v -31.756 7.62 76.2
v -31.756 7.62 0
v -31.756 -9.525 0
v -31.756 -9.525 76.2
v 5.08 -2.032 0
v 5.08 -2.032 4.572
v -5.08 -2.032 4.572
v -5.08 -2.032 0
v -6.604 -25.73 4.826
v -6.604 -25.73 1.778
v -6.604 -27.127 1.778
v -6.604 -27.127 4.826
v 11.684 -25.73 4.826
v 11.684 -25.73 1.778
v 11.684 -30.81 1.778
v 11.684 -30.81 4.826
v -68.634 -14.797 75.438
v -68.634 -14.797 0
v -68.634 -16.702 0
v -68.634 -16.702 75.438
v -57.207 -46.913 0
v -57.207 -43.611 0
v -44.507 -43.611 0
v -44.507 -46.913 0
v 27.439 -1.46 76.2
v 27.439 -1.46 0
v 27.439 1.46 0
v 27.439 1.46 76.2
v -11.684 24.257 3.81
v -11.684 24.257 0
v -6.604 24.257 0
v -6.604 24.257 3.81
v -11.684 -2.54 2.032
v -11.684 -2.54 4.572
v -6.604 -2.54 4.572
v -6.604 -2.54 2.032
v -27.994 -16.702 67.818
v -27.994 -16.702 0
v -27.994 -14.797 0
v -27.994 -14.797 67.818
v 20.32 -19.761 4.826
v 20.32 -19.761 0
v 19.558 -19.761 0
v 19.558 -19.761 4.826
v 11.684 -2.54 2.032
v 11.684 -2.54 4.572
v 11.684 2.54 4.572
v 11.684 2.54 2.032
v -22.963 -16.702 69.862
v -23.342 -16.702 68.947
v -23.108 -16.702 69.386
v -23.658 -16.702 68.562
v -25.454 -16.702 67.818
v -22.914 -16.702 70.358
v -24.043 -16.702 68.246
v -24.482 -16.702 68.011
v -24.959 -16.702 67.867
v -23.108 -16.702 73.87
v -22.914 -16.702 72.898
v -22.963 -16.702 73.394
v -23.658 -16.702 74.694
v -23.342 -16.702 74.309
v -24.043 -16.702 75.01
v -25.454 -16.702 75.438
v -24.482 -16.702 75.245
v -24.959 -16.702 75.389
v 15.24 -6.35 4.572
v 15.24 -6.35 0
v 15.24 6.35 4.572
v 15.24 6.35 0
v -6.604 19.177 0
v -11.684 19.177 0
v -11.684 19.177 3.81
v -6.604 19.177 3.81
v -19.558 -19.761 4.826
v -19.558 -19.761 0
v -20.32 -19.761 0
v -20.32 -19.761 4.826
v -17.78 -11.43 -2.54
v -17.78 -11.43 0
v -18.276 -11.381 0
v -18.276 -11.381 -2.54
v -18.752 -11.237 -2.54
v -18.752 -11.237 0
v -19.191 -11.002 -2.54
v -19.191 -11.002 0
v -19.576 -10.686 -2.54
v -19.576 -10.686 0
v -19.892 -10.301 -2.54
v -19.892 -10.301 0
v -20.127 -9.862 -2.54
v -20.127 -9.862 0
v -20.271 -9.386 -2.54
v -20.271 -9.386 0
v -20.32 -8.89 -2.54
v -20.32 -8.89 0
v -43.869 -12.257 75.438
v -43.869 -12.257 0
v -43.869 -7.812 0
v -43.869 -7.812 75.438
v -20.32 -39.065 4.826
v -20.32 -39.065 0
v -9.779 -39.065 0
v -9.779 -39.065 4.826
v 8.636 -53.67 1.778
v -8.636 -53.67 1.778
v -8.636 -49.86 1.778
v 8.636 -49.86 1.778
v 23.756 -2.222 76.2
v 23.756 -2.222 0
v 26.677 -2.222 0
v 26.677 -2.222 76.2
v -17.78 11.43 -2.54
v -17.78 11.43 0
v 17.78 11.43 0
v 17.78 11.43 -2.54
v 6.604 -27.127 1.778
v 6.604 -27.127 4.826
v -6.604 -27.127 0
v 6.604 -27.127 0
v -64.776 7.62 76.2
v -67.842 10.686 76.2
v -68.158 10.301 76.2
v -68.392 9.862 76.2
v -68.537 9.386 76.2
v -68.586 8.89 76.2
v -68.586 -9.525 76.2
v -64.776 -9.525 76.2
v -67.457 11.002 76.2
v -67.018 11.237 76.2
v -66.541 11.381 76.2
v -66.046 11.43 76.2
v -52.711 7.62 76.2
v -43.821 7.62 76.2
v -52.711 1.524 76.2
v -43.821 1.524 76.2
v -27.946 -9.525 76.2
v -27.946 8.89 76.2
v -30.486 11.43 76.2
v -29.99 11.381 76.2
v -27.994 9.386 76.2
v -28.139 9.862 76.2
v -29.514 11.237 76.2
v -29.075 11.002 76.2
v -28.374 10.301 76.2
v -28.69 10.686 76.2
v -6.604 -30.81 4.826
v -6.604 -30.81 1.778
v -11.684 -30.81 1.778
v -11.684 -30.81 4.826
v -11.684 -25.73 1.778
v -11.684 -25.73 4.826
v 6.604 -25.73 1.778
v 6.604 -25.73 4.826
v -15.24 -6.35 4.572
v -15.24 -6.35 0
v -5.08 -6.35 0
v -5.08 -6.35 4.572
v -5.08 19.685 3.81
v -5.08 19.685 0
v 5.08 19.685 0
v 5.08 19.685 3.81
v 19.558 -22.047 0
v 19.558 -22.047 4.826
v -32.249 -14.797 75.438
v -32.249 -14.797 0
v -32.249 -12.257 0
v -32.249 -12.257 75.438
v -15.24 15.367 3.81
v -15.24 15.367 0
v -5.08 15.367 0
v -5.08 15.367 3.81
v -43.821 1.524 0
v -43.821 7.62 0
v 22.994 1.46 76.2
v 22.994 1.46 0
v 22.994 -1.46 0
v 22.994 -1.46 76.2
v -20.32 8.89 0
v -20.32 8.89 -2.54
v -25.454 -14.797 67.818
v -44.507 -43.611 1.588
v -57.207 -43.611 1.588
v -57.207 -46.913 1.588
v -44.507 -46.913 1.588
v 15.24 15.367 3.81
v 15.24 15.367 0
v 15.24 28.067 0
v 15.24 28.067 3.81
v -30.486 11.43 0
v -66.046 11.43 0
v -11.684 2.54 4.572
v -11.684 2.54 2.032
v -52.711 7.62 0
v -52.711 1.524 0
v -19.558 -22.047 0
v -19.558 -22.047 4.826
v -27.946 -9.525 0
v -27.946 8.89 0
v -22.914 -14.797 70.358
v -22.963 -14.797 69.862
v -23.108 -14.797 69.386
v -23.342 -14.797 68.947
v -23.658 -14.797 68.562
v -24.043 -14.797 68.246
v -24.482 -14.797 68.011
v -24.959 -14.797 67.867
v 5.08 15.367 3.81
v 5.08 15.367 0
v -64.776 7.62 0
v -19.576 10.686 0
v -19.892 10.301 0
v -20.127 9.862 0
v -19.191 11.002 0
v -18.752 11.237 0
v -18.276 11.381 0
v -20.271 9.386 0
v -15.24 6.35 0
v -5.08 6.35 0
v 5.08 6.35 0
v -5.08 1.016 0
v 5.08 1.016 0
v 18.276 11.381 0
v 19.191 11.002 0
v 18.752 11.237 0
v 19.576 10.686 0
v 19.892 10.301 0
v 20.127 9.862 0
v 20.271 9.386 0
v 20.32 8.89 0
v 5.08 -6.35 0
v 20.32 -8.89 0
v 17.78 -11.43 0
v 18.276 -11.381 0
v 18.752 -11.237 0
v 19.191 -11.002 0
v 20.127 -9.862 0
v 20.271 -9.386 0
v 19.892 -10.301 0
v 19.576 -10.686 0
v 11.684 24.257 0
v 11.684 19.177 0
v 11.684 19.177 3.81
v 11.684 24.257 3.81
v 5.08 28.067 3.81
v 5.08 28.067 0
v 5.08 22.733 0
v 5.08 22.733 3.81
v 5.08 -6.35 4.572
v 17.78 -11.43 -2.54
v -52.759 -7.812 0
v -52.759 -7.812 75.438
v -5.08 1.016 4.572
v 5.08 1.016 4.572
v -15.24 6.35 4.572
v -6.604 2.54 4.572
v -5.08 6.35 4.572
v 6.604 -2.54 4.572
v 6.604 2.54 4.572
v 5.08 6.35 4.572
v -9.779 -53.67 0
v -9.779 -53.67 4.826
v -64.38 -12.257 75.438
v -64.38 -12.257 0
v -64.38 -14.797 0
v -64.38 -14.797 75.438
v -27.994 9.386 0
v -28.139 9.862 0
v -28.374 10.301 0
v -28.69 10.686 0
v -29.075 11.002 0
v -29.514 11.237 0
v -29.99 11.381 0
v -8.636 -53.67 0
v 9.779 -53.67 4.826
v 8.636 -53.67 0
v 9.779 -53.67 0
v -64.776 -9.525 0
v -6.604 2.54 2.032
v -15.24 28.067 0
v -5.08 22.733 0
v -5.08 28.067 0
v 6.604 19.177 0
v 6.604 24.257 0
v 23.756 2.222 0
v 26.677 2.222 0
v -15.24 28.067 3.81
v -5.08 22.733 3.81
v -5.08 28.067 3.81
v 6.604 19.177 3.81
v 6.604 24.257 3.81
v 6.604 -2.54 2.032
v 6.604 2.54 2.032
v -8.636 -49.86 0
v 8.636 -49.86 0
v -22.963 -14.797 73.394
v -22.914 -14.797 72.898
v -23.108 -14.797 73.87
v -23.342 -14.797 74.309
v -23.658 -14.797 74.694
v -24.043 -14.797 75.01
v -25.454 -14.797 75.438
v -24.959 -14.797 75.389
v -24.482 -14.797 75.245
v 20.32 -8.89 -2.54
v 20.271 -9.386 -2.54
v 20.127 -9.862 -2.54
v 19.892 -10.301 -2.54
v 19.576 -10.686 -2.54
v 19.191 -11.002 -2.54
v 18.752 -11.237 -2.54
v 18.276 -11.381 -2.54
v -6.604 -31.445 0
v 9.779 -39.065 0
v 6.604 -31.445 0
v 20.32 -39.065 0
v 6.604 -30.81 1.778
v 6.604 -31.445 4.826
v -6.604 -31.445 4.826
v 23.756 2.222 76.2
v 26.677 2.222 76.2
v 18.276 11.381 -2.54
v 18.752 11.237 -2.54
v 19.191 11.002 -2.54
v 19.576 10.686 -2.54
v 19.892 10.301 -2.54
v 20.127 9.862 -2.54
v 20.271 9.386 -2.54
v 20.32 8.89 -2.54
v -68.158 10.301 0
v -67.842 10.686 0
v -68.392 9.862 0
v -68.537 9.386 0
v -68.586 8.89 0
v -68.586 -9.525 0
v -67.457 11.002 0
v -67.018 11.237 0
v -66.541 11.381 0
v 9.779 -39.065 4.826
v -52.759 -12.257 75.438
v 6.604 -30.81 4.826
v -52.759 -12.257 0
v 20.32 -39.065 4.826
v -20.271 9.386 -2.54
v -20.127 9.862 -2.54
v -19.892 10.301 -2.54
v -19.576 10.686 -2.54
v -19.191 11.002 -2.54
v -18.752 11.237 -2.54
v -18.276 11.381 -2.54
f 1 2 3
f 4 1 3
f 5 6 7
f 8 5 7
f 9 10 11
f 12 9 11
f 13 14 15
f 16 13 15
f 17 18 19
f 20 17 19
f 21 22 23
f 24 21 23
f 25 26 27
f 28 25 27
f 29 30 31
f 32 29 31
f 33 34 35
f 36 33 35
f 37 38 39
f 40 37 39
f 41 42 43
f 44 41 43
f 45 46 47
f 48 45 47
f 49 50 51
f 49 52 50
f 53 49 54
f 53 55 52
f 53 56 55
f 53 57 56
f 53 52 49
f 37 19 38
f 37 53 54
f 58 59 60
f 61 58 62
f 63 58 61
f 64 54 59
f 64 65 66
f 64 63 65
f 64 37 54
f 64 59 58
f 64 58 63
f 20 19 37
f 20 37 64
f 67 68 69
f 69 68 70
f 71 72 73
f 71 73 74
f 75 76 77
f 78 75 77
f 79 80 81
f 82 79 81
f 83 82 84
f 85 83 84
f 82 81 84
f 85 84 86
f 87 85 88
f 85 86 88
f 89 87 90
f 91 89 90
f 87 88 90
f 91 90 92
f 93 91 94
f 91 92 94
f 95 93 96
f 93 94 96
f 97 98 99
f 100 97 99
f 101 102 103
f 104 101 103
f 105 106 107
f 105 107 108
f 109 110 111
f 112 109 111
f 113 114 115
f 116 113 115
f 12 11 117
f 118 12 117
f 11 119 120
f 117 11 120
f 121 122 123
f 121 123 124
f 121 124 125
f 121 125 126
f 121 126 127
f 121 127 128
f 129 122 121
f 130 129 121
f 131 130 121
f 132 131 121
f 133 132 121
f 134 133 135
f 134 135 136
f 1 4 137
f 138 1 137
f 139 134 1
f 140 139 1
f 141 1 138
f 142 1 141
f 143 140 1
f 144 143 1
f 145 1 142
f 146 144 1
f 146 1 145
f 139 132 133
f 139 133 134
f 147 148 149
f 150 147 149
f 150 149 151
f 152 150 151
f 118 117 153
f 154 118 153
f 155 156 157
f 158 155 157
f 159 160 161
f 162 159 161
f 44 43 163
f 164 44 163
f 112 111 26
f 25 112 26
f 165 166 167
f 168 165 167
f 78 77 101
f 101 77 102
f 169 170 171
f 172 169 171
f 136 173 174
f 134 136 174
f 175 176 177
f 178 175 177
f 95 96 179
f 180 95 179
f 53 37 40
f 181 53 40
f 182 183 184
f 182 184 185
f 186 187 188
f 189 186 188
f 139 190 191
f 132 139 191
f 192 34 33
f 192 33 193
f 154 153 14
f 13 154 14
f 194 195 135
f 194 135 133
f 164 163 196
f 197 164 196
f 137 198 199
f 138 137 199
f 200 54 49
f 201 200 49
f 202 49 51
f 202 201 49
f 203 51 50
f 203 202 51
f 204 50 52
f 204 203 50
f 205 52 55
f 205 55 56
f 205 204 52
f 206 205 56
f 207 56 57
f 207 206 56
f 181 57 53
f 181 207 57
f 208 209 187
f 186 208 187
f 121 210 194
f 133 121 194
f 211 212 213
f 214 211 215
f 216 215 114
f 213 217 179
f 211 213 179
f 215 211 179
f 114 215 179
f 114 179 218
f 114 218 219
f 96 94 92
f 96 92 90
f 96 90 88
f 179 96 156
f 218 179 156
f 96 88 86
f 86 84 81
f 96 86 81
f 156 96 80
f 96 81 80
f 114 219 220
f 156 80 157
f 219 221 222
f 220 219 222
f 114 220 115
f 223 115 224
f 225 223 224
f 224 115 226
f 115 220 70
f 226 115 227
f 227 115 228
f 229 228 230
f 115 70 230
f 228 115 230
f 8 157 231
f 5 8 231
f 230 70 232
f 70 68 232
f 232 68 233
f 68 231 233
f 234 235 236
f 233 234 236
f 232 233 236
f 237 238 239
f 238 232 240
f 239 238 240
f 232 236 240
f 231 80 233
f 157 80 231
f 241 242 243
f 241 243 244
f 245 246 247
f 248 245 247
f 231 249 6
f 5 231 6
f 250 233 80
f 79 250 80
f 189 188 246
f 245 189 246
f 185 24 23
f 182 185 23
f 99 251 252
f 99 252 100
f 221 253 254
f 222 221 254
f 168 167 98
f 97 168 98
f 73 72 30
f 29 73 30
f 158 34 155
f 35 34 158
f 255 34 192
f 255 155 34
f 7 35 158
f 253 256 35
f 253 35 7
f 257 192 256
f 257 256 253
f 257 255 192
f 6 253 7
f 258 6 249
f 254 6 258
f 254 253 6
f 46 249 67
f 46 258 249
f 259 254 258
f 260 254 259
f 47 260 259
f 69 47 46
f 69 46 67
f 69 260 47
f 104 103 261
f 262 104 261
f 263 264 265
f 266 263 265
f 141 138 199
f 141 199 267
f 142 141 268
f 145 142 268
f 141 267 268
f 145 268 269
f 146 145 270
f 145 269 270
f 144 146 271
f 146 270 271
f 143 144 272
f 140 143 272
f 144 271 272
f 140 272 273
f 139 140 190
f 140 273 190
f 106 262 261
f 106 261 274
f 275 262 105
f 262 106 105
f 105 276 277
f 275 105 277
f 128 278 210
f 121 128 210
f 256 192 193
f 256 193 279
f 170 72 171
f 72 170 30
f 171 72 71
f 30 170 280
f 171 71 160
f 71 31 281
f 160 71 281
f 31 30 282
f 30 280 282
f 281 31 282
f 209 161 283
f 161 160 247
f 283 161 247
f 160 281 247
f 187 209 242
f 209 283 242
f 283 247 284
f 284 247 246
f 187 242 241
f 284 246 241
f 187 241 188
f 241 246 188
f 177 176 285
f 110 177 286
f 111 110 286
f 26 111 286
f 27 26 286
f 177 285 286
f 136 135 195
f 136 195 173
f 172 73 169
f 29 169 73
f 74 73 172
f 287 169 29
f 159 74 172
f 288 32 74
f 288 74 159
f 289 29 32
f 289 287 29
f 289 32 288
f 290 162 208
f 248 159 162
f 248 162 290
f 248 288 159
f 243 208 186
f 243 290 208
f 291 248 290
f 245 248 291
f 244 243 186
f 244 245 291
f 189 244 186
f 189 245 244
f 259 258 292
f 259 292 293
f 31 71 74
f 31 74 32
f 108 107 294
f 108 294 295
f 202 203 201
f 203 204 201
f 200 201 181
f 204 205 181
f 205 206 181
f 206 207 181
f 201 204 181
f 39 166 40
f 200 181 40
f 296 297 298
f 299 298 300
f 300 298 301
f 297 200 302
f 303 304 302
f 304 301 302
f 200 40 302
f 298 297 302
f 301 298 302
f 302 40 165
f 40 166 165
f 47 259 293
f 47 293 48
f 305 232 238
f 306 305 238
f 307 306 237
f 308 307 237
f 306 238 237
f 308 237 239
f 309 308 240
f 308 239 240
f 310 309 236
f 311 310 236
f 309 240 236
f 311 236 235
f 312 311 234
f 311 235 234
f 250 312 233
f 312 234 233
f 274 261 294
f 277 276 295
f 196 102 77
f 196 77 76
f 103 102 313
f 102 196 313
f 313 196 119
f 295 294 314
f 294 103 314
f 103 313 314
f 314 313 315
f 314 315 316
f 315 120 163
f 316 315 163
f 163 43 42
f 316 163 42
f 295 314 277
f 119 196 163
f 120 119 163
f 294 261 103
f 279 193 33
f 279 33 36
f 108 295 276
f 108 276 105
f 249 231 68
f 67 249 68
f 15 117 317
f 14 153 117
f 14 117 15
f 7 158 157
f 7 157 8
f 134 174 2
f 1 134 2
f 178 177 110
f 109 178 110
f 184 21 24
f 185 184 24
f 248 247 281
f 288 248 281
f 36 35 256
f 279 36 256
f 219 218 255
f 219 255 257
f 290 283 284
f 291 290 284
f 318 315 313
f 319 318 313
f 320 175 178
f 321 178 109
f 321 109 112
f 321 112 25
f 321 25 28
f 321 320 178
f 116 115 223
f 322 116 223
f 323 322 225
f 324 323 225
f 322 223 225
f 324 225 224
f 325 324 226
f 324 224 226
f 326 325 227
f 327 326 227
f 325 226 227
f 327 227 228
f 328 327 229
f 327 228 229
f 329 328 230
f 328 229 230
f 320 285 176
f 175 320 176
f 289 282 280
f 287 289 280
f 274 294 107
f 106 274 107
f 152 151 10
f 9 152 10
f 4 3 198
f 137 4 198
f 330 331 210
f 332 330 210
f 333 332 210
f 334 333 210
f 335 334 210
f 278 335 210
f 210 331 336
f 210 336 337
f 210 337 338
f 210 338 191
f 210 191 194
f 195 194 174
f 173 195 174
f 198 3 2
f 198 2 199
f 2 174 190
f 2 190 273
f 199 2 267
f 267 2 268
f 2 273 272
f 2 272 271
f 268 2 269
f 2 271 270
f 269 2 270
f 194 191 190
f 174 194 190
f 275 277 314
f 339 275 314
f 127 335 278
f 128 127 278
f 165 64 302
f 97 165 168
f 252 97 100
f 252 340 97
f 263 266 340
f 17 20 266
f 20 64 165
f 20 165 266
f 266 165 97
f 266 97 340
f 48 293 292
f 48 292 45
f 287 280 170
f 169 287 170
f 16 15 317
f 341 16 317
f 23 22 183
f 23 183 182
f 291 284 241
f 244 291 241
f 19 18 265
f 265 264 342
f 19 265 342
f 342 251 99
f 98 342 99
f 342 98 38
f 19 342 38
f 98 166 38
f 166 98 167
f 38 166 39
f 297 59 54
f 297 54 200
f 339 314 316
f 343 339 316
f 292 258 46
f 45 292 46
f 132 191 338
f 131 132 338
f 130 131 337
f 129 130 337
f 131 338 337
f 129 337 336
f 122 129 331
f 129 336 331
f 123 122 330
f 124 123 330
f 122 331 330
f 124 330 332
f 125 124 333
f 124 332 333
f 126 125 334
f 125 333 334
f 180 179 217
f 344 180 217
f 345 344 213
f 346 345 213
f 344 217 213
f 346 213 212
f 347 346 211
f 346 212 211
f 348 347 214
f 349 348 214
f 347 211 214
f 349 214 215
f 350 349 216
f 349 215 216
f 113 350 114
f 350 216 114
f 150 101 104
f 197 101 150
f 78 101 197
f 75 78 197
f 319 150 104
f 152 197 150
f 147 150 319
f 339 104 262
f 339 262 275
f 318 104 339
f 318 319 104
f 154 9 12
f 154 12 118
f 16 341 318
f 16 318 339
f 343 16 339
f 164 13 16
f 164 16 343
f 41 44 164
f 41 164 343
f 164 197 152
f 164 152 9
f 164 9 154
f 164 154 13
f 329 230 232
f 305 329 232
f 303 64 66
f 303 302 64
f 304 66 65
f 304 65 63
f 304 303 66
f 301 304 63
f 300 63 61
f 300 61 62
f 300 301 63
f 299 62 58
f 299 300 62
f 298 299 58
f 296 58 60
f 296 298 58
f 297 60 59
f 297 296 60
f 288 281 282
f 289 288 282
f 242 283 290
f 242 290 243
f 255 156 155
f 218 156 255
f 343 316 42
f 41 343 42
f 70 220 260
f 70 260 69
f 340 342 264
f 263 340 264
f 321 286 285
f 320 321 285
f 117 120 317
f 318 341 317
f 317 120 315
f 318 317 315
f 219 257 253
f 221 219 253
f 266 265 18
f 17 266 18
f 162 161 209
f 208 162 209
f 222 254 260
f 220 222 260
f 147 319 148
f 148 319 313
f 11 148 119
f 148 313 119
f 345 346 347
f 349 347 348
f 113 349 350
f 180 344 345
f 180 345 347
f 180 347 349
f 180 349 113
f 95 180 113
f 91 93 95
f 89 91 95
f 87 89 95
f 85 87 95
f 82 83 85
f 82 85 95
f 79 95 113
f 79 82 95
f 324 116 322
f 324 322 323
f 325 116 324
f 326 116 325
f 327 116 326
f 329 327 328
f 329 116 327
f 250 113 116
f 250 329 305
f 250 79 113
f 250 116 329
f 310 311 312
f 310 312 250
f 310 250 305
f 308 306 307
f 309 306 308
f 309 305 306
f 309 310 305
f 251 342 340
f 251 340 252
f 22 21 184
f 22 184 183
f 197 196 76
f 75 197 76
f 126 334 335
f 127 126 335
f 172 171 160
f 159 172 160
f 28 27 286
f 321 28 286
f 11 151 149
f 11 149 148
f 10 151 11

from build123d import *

# Parameters (mm, degrees)
F0_W      = 30.48
F0_H      = 12.7
F1_DEPTH  = 4.572
F2_W      = 5.08
F2_H      = 5.08
F3_DEPTH  = 2.54
F2_H_2    = 1.524
F2_H_3    = 3.81
F2_H_4    = 4.318
F4_DEPTH  = 7.62
F6_DEPTH  = 2.54
F8_DEPTH  = 76.2
F9_W      = 5.08
F9_H      = 5.08
F10_DEPTH = 3.81
F11_W     = 8.89
F11_H     = 6.096
F12_DEPTH = 76.2
F14_DEPTH = 4.826
F15_DEPTH = 1.778
F16_W     = 17.272
F16_H     = 1.778
F17_DEPTH = 3.81
F18_W     = 12.7
F18_H     = 3.302
F19_DEPTH = 1.5875
F20_W     = 8.89
F20_H     = 4.445
F21_DEPTH = 75.438
F22_W     = 1.905
F22_H     = 7.62
F23_DEPTH = 5.08
F24_R     = 2.54
F25_R     = 2.54


# Not quite as in the source:
# - a feature names something its author has since deleted; it is built from what else it names


with BuildPart() as f1:
    # F0 (on Top) → F1 (new body)
    with BuildSketch(Plane.XY):
        Rectangle(F0_W, F0_H)
    extrude(amount=F1_DEPTH)

    # F2 (on face) → F3 (cut)
    with BuildSketch(Plane.XY.offset(4.572)):
        with Locations((-9.144, 0)):
            Rectangle(F2_W, F2_H)
        with Locations((9.144, 0)):
            Rectangle(F2_W, F2_H)
    extrude(amount=-F3_DEPTH, mode=Mode.SUBTRACT)

    # F2 (on face) → F4 (cut)
    with BuildSketch(Plane.XY.offset(4.572)):
        with Locations((-2.54, 1.778)):
            Rectangle(F2_W, F2_H_2)
        with Locations((-2.54, 4.445)):
            Rectangle(F2_W, F2_H_3)
        Polygon((5.08, 6.35), (0, 6.35), (0, 2.54), (0, 1.016), (5.08, 1.016), align=None)
        with Locations((2.54, -4.191)):
            Rectangle(F2_W, F2_H_4)
        with Locations((-2.54, -4.191)):
            Rectangle(F2_W, F2_H_4)
    extrude(amount=-F4_DEPTH, mode=Mode.SUBTRACT)

    # F5 (on face) → F6 (join)
    with BuildSketch(Plane(origin=(0, 0, 0), x_dir=(1, 0, 0), z_dir=(0, 0, -1))):
        with BuildLine():
            Line((-20.32, -6.8208193406), (-20.32, -8.89))
            ThreePointArc((-20.32, -8.89), (-19.5760512242, -10.6860512242), (-17.78, -11.43))
            Line((-17.78, -11.43), (-17.2756779939, -11.43))
            Line((-17.2756779939, -11.43), (17.78, -11.43))
            ThreePointArc((17.78, -11.43), (19.5760512242, -10.6860512242), (20.32, -8.89))
            Line((20.32, -8.89), (20.32, 0))
            Line((20.32, 0), (20.32, 8.89))
            ThreePointArc((20.32, 8.89), (19.5760512242, 10.6860512242), (17.78, 11.43))
            Line((17.78, 11.43), (0, 11.43))
            Line((0, 11.43), (-17.78, 11.43))
            ThreePointArc((-17.78, 11.43), (-19.5760512242, 10.6860512242), (-20.32, 8.89))
            Line((-20.32, 8.89), (-20.32, -6.8208193406))
        make_face()
        Polygon((5.08, 6.35), (15.24, 6.35), (15.24, -6.35), (5.08, -6.35), (5.08, -1.016), (-5.08, -1.016), (-5.08, -6.35), (-15.24, -6.35), (-15.24, 6.35), (-5.08, 6.35), (-5.08, 2.032), (5.08, 2.032), align=None, mode=Mode.SUBTRACT)
        Polygon((15.24, -6.35), (15.24, 6.35), (5.08, 6.35), (5.08, 2.032), (-5.08, 2.032), (-5.08, 6.35), (-15.24, 6.35), (-15.24, -6.35), (-5.08, -6.35), (-5.08, -1.016), (5.08, -1.016), (5.08, -6.35), align=None)
    extrude(amount=F6_DEPTH)


with BuildPart() as f8:
    # F7 (on Top) → F8 (new body)
    with BuildSketch(Plane.XY):
        Polygon((27.4387739635, 1.4605), (26.6767739635, 2.2225), (23.7557739635, 2.2225), (22.9937739635, 1.4605), (22.9937739635, -1.4605), (23.7557739635, -2.2225), (25.2162739635, -2.2225), (26.6767739635, -2.2225), (27.4387739635, -1.4605), (27.4387739635, 0), align=None)
    extrude(amount=F8_DEPTH)


with BuildPart() as f10:
    # F9 (on Top) → F10 (new body)
    with BuildSketch(Plane.XY):
        Polygon((15.24, 15.3667641968), (15.24, 28.0667641968), (5.08, 28.0667641968), (5.08, 22.7327641968), (0, 22.7327641968), (-5.08, 22.7327641968), (-5.08, 24.2567641968), (-5.08, 28.0667641968), (-15.24, 28.0667641968), (-15.24, 15.3667641968), (-5.08, 15.3667641968), (-5.08, 19.6847641968), (0, 19.6847641968), (5.08, 19.6847641968), (5.08, 15.3667641968), align=None)
        with Locations((-9.144, 21.7167641968)):
            Rectangle(F9_W, F9_H, mode=Mode.SUBTRACT)
        with Locations((9.144, 21.7167641968)):
            Rectangle(F9_W, F9_H, mode=Mode.SUBTRACT)
    extrude(amount=F10_DEPTH)


with BuildPart() as f12:
    # F11 (on Top) → F12 (new body)
    with BuildSketch(Plane.XY):
        with Locations((-48.2656806707, 4.572)):
            Rectangle(F11_W, F11_H)
        with BuildLine():
            Line((-43.8206806707, 7.62), (-31.7556806707, 7.62))
            Line((-31.7556806707, 7.62), (-31.7556806707, -7.62))
            Line((-31.7556806707, -7.62), (-31.7556806707, -9.525))
            Line((-31.7556806707, -9.525), (-27.9456806707, -9.525))
            Line((-27.9456806707, -9.525), (-27.9456806707, 8.89))
            ThreePointArc((-27.9456806707, 8.89), (-28.6896294465, 10.6860512242), (-30.4856806707, 11.43))
            Line((-30.4856806707, 11.43), (-66.0456806707, 11.43))
            ThreePointArc((-66.0456806707, 11.43), (-67.841731895, 10.6860512242), (-68.5856806707, 8.89))
            Line((-68.5856806707, 8.89), (-68.5856806707, -9.525))
            Line((-68.5856806707, -9.525), (-64.7756806707, -9.525))
            Line((-64.7756806707, -9.525), (-64.7756806707, -7.62))
            Line((-64.7756806707, -7.62), (-64.7756806707, 7.62))
            Line((-64.7756806707, 7.62), (-52.7106806707, 7.62))
            Line((-52.7106806707, 7.62), (-43.8206806707, 7.62))
        make_face()
    extrude(amount=F12_DEPTH)


with BuildPart() as f14:
    # F13 (on Top) → F14 (new body)
    with BuildSketch(Plane.XY):
        Polygon((9.779, -53.6695963979), (9.779, -39.0645963979), (0, -39.0645963979), (-9.779, -39.0645963979), (-9.779, -53.6695963979), align=None)
        Polygon((-19.558, -22.0465963979), (-19.558, -19.7605963979), (-20.32, -19.7605963979), (-20.32, -39.0645963979), (-9.779, -39.0645963979), (0, -39.0645963979), (0, -31.4445963979), (-6.604, -31.4445963979), (-6.604, -30.8095963979), (-11.684, -30.8095963979), (-11.684, -25.7295963979), (-6.604, -25.7295963979), (-6.604, -27.1265963979), (0, -27.1265963979), (0, -22.0465963979), align=None)
        Polygon((20.32, -39.0645963979), (20.32, -19.7605963979), (19.558, -19.7605963979), (19.558, -22.0465963979), (0, -22.0465963979), (0, -27.1265963979), (6.604, -27.1265963979), (6.604, -25.7295963979), (11.684, -25.7295963979), (11.684, -30.8095963979), (6.604, -30.8095963979), (6.604, -31.4445963979), (0, -31.4445963979), (0, -39.0645963979), (9.779, -39.0645963979), align=None)
    extrude(amount=F14_DEPTH)

    # F13 (on Top) → F15 (join)
    with BuildSketch(Plane.XY):
        Polygon((-6.604, -28.2695963979), (-6.604, -27.1265963979), (-6.604, -25.7295963979), (-11.684, -25.7295963979), (-11.684, -30.8095963979), (-6.604, -30.8095963979), align=None)
        Polygon((6.604, -25.7295963979), (6.604, -27.1265963979), (6.604, -30.8095963979), (11.684, -30.8095963979), (11.684, -25.7295963979), align=None)
    extrude(amount=F15_DEPTH)

    # F16 (on face) → F17 (cut)
    with BuildSketch(Plane.XZ.offset(53.6695963979)):
        with Locations((0, 0.889)):
            Rectangle(F16_W, F16_H)
    extrude(amount=-F17_DEPTH, mode=Mode.SUBTRACT)


with BuildPart() as f19:
    # F18 (on Top) → F19 (new body)
    with BuildSketch(Plane.XY):
        with Locations((-50.8568691254, -45.2617781689)):
            Rectangle(F18_W, F18_H)
    extrude(amount=F19_DEPTH)


with BuildPart() as f21:
    # F20 (on Top) → F21 (new body)
    with BuildSketch(Plane.XY):
        with Locations((-48.3141668069, -10.0349279085)):
            Rectangle(F20_W, F20_H)
        Polygon((-64.3796668069, -14.7974279085), (-32.2486668069, -14.7974279085), (-32.2486668069, -12.2574279085), (-43.8691668069, -12.2574279085), (-52.7591668069, -12.2574279085), (-64.3796668069, -12.2574279085), align=None)
        Polygon((-68.6341668069, -16.7024279085), (-27.9941668069, -16.7024279085), (-27.9941668069, -14.7974279085), (-32.2486668069, -14.7974279085), (-64.3796668069, -14.7974279085), (-68.6341668069, -14.7974279085), align=None)
    extrude(amount=F21_DEPTH)

    # F22 (on face) → F23 (join)
    with BuildSketch(Plane.YZ.offset(-27.9941668069)):
        with Locations((-15.7499279085, 71.628)):
            Rectangle(F22_W, F22_H)
    extrude(amount=F23_DEPTH)

    # F24
    f24_edges = [f21.edges().sort_by_distance(p)[0] for p in [
        (-22.914167, -15.749928, 75.438),
    ]]
    fillet(f24_edges, radius=F24_R)

    # F25
    f25_edges = [f21.edges().sort_by_distance(p)[0] for p in [
        (-22.914167, -15.749928, 67.818),
    ]]
    fillet(f25_edges, radius=F25_R)


solid = Compound([f1.part, f8.part, f10.part, f12.part, f14.part, f19.part, f21.part])
